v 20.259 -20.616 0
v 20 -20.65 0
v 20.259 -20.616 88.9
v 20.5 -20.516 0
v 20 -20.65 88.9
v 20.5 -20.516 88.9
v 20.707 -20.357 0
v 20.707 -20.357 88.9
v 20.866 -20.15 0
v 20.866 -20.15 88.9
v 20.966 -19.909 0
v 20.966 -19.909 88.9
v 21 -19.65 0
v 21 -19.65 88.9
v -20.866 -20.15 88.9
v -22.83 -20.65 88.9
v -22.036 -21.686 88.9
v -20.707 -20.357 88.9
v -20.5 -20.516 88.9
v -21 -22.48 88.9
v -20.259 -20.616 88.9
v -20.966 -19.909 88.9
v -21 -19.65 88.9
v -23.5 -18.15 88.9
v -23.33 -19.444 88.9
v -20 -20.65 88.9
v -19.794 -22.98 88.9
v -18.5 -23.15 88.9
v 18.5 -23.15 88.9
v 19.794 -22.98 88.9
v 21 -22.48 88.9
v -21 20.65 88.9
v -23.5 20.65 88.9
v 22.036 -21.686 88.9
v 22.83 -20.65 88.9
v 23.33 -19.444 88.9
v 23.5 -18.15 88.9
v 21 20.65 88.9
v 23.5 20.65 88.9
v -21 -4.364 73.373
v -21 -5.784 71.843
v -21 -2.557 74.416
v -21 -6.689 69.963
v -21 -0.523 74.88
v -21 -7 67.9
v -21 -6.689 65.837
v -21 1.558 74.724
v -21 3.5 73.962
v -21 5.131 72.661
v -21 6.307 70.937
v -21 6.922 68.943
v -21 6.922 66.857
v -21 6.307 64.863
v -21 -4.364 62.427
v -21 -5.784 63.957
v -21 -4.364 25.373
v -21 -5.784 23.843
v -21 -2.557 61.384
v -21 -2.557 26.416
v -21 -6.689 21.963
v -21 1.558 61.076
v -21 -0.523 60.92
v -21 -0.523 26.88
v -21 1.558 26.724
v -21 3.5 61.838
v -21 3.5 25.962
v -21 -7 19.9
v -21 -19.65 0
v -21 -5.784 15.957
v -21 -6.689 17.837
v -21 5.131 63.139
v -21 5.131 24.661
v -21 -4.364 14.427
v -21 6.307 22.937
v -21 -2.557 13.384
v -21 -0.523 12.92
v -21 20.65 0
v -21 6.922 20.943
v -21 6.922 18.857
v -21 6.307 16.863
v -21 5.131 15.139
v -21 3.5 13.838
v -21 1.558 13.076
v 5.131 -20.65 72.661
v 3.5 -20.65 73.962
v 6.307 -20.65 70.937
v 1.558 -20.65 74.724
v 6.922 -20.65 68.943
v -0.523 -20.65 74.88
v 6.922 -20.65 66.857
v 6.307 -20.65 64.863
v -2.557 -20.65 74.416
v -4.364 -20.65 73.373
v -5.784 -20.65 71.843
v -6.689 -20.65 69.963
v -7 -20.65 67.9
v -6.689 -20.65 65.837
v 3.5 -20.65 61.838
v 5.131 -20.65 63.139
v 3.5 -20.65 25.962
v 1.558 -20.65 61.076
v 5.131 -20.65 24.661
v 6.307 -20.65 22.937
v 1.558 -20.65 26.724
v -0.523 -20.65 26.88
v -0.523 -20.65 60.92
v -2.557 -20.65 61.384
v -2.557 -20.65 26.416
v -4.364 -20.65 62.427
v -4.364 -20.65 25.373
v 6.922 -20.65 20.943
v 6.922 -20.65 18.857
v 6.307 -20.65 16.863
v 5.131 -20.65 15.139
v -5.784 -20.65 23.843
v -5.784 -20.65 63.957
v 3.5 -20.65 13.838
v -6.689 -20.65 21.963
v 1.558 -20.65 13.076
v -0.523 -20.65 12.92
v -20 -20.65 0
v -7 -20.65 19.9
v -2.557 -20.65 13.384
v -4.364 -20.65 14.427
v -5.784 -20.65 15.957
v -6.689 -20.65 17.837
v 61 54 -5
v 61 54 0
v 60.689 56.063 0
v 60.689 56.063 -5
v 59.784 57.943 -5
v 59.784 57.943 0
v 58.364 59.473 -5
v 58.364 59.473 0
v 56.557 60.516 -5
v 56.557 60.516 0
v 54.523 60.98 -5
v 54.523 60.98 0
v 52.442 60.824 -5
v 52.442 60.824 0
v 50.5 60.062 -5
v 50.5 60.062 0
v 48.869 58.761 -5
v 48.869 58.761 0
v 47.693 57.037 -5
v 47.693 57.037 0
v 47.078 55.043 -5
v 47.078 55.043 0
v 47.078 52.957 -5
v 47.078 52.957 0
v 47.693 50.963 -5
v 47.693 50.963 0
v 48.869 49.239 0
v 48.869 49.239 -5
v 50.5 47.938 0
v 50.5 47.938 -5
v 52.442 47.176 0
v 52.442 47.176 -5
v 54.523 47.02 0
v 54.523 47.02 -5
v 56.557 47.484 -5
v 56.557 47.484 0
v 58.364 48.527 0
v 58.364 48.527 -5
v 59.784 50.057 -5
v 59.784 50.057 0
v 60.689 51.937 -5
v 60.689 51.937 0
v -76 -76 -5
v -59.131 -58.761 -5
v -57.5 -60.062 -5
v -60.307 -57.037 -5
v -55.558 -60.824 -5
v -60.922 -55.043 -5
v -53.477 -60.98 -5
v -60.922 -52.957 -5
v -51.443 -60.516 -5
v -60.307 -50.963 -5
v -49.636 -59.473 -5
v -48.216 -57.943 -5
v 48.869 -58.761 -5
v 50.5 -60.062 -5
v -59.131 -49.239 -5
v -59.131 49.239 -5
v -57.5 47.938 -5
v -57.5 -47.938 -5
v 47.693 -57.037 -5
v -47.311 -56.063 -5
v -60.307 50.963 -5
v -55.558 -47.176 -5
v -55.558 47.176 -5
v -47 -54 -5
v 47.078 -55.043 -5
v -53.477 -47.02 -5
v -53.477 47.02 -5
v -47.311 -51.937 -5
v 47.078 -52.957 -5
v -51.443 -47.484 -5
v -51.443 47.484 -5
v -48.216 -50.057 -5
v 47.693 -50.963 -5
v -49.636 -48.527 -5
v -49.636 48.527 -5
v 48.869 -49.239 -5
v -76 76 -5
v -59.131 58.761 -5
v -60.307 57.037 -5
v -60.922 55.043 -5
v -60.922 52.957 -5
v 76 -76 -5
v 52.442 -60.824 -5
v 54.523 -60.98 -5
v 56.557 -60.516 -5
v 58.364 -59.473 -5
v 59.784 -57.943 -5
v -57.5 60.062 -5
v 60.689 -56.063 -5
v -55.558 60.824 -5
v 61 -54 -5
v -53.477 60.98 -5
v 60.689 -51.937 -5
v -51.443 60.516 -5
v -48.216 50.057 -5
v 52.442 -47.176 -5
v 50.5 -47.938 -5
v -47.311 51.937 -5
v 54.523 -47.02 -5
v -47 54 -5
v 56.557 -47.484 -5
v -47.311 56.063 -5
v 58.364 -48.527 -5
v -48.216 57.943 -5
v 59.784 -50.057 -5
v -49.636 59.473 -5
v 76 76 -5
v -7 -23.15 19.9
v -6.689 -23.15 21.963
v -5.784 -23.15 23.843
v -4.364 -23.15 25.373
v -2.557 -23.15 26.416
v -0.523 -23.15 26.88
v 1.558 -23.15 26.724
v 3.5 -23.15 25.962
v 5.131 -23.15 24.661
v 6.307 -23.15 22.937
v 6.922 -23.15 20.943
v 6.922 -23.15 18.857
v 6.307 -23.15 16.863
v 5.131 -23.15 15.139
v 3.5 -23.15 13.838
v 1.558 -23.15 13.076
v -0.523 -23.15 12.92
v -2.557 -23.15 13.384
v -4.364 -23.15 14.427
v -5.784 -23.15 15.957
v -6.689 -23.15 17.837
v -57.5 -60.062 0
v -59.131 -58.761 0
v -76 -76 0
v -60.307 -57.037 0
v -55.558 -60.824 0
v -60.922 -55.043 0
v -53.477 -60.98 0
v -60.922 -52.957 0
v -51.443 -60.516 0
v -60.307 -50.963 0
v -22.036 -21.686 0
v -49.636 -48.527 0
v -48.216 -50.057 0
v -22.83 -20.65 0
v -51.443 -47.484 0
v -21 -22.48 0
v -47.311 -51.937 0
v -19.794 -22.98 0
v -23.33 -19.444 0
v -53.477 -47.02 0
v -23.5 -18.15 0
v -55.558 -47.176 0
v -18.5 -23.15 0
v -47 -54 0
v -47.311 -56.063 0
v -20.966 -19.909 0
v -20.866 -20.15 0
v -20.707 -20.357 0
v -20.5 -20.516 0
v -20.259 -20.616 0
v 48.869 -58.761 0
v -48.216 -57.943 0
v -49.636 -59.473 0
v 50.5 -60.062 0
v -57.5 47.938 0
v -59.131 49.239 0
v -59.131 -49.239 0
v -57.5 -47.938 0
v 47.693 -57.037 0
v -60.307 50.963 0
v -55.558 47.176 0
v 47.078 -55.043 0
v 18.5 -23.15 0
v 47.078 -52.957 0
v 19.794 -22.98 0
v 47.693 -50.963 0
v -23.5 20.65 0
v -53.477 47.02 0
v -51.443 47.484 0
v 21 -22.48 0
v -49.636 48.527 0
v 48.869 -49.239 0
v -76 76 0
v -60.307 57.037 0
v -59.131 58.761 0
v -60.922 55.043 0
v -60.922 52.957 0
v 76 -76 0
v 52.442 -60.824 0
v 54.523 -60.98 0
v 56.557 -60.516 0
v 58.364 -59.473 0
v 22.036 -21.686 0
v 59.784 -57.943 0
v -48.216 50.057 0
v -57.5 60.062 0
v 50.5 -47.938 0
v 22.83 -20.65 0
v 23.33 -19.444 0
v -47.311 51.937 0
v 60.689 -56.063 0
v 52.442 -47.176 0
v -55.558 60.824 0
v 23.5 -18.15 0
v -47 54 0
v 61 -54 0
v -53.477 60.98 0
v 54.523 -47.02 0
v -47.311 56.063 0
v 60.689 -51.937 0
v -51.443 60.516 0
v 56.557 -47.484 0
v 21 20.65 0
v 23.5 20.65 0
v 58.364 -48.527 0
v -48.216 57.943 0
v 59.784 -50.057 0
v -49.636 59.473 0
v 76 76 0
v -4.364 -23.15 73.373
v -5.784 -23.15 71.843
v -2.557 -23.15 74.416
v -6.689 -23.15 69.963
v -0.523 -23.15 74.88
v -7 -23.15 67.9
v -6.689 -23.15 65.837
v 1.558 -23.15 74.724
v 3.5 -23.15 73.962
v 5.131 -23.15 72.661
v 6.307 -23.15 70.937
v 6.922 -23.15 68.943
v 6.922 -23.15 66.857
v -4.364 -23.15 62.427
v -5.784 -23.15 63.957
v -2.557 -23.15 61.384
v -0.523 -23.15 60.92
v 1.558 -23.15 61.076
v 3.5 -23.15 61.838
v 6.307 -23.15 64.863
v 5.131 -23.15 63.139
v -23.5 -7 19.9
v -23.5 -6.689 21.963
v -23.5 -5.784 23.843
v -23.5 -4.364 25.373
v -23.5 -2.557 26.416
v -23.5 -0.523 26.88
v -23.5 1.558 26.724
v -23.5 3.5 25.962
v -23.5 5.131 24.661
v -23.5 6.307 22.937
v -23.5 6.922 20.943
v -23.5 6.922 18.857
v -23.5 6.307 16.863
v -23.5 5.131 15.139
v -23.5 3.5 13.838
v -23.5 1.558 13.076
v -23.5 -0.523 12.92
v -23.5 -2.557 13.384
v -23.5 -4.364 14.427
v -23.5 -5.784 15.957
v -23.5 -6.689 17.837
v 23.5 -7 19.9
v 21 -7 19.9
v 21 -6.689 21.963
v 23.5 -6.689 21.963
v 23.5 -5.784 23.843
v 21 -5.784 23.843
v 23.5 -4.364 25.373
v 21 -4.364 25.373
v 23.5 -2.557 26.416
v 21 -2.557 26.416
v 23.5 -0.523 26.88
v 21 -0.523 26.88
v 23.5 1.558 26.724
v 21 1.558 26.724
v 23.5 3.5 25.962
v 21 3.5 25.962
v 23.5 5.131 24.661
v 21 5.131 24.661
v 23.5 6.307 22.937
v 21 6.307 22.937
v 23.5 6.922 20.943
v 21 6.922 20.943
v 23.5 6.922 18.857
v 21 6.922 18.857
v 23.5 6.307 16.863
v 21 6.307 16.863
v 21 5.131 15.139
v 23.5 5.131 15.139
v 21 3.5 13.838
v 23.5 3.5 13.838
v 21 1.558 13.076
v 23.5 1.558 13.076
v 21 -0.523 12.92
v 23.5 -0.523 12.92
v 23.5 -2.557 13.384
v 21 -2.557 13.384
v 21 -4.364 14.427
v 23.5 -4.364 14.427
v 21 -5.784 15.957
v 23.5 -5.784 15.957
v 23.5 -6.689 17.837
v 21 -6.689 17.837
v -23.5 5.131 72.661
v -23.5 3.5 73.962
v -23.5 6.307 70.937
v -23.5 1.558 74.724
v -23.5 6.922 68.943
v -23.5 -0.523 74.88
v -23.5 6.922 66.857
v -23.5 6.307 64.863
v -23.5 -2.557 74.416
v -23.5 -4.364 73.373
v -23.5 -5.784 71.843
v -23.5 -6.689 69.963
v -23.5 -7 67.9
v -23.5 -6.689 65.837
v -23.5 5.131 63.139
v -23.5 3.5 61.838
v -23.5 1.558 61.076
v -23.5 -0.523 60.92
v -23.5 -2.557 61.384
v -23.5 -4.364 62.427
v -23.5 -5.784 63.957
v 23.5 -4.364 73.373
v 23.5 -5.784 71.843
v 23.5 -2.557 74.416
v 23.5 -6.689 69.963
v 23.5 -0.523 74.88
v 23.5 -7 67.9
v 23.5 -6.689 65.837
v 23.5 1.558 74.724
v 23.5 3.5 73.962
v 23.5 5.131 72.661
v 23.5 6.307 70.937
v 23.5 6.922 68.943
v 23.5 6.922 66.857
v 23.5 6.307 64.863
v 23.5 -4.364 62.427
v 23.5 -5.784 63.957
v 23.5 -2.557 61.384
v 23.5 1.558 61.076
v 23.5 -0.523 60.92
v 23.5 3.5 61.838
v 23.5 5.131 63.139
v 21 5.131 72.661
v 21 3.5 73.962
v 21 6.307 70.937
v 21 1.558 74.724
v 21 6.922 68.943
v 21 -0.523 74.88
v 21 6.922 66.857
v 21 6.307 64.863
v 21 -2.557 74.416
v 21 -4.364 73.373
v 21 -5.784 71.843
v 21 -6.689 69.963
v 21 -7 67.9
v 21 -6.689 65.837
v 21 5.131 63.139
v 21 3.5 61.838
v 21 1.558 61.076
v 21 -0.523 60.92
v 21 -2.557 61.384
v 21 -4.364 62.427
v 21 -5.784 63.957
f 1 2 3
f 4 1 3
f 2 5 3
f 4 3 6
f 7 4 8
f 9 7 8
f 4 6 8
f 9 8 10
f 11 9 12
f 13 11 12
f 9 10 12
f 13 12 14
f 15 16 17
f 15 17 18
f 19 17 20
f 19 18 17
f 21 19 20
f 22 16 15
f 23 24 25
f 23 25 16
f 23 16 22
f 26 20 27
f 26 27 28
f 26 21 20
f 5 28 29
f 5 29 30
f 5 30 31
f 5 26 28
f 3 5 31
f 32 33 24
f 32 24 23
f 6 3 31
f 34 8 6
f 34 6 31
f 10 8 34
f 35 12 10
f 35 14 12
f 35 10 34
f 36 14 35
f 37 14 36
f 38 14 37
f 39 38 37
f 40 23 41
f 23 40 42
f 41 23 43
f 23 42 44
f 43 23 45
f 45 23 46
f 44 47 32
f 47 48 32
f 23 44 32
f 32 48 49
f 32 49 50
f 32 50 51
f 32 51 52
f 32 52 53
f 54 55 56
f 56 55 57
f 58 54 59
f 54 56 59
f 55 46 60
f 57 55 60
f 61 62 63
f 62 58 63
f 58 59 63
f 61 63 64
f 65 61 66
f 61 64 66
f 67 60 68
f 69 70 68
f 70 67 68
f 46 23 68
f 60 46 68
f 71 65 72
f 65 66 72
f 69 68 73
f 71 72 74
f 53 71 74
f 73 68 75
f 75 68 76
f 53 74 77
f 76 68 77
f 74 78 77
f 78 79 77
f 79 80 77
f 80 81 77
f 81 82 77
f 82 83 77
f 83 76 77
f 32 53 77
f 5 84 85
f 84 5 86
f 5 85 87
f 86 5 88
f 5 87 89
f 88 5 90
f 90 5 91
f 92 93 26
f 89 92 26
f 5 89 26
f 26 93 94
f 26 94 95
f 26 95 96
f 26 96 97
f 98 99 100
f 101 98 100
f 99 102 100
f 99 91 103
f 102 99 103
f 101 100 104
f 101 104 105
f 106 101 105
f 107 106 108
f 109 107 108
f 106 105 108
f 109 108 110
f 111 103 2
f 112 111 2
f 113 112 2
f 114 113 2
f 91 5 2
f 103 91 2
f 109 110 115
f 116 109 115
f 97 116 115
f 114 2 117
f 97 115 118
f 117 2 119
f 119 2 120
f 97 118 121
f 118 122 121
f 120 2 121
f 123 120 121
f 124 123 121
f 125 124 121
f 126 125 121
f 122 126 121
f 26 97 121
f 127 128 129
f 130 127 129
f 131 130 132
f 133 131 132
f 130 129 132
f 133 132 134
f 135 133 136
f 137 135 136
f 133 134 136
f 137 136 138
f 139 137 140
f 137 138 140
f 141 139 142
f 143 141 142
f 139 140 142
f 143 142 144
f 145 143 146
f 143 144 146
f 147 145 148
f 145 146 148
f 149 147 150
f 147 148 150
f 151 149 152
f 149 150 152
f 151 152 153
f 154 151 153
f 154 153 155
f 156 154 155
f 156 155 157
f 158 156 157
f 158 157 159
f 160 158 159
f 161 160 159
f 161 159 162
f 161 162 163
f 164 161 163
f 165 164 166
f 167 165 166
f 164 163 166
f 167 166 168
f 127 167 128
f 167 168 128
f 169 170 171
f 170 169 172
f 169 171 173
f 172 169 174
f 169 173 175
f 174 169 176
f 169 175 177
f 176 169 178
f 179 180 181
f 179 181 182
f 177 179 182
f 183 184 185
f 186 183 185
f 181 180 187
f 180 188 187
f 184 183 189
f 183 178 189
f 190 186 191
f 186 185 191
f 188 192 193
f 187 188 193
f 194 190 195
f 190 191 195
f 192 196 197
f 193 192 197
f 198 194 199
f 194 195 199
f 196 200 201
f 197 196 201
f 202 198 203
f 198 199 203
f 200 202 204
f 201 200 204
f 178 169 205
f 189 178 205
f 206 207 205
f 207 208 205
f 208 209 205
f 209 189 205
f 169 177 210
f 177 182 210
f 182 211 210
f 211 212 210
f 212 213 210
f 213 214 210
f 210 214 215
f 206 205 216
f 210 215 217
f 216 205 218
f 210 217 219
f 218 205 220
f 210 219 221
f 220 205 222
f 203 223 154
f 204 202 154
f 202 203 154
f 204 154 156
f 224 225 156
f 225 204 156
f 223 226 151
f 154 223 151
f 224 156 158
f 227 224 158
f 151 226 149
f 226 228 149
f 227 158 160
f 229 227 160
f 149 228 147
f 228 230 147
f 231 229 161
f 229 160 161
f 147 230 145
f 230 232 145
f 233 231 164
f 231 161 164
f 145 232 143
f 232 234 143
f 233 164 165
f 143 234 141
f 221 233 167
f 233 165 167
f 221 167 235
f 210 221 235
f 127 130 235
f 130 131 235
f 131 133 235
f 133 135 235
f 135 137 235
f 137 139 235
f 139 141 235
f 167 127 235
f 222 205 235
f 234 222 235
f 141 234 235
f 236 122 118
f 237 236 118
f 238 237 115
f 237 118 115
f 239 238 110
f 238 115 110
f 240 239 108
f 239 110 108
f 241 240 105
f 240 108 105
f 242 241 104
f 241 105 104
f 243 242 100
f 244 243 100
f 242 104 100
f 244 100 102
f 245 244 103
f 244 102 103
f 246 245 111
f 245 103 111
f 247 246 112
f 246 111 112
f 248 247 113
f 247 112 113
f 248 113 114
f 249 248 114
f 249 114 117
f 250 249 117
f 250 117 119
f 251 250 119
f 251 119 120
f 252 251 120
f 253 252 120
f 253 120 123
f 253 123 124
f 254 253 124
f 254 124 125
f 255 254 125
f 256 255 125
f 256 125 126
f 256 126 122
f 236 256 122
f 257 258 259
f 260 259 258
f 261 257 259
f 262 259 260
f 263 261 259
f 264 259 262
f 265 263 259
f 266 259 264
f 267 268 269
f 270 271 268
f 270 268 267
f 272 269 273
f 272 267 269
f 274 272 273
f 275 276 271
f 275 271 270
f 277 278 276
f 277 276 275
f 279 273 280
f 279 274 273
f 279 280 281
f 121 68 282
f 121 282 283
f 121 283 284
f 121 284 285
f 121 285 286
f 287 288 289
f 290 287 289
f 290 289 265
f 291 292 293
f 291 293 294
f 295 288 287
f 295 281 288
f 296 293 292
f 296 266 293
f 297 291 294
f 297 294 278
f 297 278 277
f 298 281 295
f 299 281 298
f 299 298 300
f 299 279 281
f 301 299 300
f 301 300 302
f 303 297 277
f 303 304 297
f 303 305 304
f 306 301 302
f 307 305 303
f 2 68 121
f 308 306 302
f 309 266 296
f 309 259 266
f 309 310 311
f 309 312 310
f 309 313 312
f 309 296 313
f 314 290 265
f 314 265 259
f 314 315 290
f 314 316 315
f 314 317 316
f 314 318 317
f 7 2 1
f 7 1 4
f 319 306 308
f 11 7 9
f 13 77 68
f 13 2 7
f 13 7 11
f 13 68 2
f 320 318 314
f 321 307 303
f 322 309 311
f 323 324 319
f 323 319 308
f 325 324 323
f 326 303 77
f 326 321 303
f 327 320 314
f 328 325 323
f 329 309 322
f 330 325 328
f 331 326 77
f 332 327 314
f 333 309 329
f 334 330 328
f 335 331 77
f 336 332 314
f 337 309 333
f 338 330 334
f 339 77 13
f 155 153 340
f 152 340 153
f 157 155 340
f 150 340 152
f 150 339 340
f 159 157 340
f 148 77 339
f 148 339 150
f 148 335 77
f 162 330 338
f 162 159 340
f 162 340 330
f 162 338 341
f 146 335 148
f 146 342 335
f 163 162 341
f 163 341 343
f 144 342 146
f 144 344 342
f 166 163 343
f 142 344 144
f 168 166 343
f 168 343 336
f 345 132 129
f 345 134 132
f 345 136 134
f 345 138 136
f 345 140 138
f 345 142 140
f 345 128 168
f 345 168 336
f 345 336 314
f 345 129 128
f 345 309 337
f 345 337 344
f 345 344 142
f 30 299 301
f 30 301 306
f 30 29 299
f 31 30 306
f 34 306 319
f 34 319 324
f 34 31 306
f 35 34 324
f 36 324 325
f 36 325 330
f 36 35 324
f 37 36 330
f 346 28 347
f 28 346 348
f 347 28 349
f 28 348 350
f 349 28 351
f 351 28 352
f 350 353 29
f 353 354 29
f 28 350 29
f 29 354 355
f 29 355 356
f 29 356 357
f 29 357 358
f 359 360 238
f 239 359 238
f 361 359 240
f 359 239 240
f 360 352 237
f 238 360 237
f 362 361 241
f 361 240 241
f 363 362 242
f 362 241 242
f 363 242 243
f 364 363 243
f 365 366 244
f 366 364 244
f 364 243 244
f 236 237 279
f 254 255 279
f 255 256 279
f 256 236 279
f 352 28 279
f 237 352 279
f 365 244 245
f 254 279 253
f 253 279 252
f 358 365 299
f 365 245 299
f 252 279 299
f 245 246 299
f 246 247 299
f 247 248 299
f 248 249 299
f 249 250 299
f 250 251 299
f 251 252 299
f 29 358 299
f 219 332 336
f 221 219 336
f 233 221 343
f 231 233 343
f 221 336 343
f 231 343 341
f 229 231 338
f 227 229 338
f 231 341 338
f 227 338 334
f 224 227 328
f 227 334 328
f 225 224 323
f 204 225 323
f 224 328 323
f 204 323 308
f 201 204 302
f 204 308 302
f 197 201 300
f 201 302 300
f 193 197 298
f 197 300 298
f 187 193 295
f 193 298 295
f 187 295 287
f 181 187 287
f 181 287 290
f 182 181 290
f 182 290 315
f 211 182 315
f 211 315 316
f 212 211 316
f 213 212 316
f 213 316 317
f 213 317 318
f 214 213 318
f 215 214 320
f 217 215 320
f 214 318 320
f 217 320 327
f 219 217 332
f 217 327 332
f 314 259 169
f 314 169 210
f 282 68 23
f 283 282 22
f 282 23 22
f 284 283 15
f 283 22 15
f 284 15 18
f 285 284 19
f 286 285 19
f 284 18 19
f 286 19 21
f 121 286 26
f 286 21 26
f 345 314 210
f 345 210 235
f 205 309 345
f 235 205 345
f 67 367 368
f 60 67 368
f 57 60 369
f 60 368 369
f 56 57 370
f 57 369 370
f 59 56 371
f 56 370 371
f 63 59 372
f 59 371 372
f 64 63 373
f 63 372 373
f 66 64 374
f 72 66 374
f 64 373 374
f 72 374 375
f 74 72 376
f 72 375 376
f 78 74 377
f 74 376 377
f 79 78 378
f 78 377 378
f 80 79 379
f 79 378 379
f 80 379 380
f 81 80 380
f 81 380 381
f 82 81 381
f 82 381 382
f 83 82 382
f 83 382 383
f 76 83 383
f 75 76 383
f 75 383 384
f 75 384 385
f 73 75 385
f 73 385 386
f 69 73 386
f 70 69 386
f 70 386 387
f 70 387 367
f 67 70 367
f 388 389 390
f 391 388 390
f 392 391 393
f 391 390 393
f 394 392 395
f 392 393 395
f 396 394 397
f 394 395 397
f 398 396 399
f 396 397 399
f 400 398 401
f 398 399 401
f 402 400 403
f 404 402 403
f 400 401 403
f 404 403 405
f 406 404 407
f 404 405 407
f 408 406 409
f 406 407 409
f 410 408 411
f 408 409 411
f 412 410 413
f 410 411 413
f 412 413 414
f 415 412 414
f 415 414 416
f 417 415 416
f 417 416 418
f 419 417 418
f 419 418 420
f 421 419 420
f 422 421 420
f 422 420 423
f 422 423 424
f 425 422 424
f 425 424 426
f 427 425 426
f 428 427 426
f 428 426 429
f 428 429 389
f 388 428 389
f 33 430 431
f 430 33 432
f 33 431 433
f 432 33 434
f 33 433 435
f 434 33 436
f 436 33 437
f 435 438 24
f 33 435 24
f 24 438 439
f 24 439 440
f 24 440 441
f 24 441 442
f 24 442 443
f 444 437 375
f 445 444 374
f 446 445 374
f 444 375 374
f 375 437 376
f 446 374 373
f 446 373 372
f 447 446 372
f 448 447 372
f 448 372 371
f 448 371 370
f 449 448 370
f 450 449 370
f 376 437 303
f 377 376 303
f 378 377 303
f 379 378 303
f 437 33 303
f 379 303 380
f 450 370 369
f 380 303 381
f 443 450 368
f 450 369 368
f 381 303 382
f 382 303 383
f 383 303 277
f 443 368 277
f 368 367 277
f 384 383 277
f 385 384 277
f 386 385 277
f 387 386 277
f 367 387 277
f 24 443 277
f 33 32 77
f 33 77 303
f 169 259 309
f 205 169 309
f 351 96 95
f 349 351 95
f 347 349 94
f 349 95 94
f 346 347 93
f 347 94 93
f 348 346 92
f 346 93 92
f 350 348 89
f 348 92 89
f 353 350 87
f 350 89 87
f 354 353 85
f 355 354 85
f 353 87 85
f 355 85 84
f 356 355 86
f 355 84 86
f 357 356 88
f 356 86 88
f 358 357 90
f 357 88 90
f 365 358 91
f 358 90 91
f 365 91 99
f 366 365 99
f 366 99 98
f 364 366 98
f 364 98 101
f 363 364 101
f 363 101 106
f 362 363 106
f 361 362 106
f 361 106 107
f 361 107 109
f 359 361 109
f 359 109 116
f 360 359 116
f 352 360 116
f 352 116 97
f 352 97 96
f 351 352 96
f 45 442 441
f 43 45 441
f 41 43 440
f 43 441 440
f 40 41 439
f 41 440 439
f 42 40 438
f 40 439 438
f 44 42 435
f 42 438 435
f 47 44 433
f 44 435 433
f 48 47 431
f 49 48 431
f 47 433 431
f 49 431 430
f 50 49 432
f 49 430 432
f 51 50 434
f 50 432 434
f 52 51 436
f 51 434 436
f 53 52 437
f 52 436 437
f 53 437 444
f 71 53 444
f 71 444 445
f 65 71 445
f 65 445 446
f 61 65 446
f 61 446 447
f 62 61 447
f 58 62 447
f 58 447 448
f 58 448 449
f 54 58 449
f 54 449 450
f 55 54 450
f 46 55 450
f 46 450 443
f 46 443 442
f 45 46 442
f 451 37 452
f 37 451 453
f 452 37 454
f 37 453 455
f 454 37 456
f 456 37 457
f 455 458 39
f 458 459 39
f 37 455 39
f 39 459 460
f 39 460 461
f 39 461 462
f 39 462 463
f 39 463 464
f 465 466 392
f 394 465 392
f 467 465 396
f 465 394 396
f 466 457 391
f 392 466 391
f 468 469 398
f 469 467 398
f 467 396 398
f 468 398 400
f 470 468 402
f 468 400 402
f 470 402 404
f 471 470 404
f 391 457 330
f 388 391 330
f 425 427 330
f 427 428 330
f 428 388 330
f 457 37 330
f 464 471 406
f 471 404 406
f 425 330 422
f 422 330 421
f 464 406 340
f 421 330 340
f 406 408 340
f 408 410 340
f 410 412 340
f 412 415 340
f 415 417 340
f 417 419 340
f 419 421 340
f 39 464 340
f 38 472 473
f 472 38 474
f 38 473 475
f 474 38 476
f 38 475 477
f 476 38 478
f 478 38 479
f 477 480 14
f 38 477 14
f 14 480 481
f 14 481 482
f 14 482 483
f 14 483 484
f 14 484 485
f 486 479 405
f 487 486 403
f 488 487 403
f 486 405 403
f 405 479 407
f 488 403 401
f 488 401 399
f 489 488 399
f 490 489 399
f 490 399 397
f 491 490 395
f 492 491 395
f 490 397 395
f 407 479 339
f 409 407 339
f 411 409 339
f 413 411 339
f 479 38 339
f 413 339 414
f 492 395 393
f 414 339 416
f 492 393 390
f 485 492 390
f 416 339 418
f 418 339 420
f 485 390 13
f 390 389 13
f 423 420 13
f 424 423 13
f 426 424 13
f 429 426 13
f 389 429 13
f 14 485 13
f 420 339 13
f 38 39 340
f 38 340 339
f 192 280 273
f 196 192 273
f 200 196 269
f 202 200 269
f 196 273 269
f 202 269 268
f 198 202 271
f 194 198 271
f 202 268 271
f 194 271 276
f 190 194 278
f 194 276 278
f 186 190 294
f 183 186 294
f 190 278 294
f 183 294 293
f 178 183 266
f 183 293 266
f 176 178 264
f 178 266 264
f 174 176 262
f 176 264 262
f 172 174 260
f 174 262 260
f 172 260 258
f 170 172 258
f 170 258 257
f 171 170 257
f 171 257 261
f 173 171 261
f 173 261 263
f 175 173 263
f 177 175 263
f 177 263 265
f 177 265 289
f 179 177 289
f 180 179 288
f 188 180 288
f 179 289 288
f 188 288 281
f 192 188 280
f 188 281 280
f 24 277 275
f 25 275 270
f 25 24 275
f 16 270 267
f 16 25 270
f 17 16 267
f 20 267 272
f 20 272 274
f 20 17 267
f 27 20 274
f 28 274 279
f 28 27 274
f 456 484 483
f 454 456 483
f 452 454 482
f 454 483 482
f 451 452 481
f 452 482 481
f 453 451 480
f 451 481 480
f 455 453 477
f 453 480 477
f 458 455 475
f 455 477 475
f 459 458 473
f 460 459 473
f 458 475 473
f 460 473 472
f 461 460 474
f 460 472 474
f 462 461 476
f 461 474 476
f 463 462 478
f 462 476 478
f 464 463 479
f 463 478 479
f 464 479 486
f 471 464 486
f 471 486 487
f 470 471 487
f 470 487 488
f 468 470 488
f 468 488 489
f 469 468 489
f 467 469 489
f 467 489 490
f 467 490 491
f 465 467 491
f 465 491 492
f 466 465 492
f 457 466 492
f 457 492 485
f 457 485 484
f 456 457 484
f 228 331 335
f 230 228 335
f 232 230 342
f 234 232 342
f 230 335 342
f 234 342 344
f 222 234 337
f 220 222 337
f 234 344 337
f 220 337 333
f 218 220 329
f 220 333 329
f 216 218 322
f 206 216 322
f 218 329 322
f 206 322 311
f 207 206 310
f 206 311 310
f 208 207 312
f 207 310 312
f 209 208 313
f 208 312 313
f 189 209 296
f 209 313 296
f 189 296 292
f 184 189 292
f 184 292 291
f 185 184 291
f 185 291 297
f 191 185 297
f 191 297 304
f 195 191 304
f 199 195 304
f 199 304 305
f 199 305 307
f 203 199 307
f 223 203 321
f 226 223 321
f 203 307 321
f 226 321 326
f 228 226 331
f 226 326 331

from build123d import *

# Parameters (mm, degrees)
F0_W     = 152
F0_H     = 152
F0_R     = 7
F1_DEPTH = 5
F3_DEPTH = 88.9
F4_R     = 5
F5_R     = 1
F7_D     = 14
F9_D     = 14


# Not quite as in the source:
# - a feature names something its author has since deleted; it is built from what else it names


with BuildPart() as f1:
    # F0 (on Top) → F1 (new body)
    with BuildSketch(Plane.XY):
        Rectangle(F0_W, F0_H)
        with Locations((-54, -54)):
            Circle(F0_R, mode=Mode.SUBTRACT)
        with Locations((54, -54)):
            Circle(F0_R, mode=Mode.SUBTRACT)
        with Locations((-54, 54)):
            Circle(F0_R, mode=Mode.SUBTRACT)
        with Locations((54, 54)):
            Circle(F0_R, mode=Mode.SUBTRACT)
    extrude(amount=-F1_DEPTH)

    # F2 (on face) → F3 (join)
    with BuildSketch(Plane.XY):
        Polygon((-21, 20.65), (-23.5, 20.65), (-23.5, -23.15), (23.5, -23.15), (23.5, 20.65), (21, 20.65), (21, -20.65), (-21, -20.65), align=None)
    extrude(amount=F3_DEPTH)

    # F4
    f4_edges = [f1.edges().sort_by_distance(p)[0] for p in [
        (23.5, -23.15, 44.45),
        (-23.5, -23.15, 44.45),
    ]]
    fillet(f4_edges, radius=F4_R)

    # F5
    f5_edges = [f1.edges().sort_by_distance(p)[0] for p in [
        (21, -20.65, 44.45),
        (-21, -20.65, 44.45),
    ]]
    fillet(f5_edges, radius=F5_R)

    # F7 (through all)
    with Locations(Plane.YZ.offset(23.5)):
        with Locations((0, 67.9), (0, 19.9)):
            Hole(F7_D / 2)

    # F9 (through all)
    with Locations(Plane.XZ.offset(23.15)):
        with Locations((0, 67.9), (0, 19.9)):
            Hole(F9_D / 2)


solid = f1.part
